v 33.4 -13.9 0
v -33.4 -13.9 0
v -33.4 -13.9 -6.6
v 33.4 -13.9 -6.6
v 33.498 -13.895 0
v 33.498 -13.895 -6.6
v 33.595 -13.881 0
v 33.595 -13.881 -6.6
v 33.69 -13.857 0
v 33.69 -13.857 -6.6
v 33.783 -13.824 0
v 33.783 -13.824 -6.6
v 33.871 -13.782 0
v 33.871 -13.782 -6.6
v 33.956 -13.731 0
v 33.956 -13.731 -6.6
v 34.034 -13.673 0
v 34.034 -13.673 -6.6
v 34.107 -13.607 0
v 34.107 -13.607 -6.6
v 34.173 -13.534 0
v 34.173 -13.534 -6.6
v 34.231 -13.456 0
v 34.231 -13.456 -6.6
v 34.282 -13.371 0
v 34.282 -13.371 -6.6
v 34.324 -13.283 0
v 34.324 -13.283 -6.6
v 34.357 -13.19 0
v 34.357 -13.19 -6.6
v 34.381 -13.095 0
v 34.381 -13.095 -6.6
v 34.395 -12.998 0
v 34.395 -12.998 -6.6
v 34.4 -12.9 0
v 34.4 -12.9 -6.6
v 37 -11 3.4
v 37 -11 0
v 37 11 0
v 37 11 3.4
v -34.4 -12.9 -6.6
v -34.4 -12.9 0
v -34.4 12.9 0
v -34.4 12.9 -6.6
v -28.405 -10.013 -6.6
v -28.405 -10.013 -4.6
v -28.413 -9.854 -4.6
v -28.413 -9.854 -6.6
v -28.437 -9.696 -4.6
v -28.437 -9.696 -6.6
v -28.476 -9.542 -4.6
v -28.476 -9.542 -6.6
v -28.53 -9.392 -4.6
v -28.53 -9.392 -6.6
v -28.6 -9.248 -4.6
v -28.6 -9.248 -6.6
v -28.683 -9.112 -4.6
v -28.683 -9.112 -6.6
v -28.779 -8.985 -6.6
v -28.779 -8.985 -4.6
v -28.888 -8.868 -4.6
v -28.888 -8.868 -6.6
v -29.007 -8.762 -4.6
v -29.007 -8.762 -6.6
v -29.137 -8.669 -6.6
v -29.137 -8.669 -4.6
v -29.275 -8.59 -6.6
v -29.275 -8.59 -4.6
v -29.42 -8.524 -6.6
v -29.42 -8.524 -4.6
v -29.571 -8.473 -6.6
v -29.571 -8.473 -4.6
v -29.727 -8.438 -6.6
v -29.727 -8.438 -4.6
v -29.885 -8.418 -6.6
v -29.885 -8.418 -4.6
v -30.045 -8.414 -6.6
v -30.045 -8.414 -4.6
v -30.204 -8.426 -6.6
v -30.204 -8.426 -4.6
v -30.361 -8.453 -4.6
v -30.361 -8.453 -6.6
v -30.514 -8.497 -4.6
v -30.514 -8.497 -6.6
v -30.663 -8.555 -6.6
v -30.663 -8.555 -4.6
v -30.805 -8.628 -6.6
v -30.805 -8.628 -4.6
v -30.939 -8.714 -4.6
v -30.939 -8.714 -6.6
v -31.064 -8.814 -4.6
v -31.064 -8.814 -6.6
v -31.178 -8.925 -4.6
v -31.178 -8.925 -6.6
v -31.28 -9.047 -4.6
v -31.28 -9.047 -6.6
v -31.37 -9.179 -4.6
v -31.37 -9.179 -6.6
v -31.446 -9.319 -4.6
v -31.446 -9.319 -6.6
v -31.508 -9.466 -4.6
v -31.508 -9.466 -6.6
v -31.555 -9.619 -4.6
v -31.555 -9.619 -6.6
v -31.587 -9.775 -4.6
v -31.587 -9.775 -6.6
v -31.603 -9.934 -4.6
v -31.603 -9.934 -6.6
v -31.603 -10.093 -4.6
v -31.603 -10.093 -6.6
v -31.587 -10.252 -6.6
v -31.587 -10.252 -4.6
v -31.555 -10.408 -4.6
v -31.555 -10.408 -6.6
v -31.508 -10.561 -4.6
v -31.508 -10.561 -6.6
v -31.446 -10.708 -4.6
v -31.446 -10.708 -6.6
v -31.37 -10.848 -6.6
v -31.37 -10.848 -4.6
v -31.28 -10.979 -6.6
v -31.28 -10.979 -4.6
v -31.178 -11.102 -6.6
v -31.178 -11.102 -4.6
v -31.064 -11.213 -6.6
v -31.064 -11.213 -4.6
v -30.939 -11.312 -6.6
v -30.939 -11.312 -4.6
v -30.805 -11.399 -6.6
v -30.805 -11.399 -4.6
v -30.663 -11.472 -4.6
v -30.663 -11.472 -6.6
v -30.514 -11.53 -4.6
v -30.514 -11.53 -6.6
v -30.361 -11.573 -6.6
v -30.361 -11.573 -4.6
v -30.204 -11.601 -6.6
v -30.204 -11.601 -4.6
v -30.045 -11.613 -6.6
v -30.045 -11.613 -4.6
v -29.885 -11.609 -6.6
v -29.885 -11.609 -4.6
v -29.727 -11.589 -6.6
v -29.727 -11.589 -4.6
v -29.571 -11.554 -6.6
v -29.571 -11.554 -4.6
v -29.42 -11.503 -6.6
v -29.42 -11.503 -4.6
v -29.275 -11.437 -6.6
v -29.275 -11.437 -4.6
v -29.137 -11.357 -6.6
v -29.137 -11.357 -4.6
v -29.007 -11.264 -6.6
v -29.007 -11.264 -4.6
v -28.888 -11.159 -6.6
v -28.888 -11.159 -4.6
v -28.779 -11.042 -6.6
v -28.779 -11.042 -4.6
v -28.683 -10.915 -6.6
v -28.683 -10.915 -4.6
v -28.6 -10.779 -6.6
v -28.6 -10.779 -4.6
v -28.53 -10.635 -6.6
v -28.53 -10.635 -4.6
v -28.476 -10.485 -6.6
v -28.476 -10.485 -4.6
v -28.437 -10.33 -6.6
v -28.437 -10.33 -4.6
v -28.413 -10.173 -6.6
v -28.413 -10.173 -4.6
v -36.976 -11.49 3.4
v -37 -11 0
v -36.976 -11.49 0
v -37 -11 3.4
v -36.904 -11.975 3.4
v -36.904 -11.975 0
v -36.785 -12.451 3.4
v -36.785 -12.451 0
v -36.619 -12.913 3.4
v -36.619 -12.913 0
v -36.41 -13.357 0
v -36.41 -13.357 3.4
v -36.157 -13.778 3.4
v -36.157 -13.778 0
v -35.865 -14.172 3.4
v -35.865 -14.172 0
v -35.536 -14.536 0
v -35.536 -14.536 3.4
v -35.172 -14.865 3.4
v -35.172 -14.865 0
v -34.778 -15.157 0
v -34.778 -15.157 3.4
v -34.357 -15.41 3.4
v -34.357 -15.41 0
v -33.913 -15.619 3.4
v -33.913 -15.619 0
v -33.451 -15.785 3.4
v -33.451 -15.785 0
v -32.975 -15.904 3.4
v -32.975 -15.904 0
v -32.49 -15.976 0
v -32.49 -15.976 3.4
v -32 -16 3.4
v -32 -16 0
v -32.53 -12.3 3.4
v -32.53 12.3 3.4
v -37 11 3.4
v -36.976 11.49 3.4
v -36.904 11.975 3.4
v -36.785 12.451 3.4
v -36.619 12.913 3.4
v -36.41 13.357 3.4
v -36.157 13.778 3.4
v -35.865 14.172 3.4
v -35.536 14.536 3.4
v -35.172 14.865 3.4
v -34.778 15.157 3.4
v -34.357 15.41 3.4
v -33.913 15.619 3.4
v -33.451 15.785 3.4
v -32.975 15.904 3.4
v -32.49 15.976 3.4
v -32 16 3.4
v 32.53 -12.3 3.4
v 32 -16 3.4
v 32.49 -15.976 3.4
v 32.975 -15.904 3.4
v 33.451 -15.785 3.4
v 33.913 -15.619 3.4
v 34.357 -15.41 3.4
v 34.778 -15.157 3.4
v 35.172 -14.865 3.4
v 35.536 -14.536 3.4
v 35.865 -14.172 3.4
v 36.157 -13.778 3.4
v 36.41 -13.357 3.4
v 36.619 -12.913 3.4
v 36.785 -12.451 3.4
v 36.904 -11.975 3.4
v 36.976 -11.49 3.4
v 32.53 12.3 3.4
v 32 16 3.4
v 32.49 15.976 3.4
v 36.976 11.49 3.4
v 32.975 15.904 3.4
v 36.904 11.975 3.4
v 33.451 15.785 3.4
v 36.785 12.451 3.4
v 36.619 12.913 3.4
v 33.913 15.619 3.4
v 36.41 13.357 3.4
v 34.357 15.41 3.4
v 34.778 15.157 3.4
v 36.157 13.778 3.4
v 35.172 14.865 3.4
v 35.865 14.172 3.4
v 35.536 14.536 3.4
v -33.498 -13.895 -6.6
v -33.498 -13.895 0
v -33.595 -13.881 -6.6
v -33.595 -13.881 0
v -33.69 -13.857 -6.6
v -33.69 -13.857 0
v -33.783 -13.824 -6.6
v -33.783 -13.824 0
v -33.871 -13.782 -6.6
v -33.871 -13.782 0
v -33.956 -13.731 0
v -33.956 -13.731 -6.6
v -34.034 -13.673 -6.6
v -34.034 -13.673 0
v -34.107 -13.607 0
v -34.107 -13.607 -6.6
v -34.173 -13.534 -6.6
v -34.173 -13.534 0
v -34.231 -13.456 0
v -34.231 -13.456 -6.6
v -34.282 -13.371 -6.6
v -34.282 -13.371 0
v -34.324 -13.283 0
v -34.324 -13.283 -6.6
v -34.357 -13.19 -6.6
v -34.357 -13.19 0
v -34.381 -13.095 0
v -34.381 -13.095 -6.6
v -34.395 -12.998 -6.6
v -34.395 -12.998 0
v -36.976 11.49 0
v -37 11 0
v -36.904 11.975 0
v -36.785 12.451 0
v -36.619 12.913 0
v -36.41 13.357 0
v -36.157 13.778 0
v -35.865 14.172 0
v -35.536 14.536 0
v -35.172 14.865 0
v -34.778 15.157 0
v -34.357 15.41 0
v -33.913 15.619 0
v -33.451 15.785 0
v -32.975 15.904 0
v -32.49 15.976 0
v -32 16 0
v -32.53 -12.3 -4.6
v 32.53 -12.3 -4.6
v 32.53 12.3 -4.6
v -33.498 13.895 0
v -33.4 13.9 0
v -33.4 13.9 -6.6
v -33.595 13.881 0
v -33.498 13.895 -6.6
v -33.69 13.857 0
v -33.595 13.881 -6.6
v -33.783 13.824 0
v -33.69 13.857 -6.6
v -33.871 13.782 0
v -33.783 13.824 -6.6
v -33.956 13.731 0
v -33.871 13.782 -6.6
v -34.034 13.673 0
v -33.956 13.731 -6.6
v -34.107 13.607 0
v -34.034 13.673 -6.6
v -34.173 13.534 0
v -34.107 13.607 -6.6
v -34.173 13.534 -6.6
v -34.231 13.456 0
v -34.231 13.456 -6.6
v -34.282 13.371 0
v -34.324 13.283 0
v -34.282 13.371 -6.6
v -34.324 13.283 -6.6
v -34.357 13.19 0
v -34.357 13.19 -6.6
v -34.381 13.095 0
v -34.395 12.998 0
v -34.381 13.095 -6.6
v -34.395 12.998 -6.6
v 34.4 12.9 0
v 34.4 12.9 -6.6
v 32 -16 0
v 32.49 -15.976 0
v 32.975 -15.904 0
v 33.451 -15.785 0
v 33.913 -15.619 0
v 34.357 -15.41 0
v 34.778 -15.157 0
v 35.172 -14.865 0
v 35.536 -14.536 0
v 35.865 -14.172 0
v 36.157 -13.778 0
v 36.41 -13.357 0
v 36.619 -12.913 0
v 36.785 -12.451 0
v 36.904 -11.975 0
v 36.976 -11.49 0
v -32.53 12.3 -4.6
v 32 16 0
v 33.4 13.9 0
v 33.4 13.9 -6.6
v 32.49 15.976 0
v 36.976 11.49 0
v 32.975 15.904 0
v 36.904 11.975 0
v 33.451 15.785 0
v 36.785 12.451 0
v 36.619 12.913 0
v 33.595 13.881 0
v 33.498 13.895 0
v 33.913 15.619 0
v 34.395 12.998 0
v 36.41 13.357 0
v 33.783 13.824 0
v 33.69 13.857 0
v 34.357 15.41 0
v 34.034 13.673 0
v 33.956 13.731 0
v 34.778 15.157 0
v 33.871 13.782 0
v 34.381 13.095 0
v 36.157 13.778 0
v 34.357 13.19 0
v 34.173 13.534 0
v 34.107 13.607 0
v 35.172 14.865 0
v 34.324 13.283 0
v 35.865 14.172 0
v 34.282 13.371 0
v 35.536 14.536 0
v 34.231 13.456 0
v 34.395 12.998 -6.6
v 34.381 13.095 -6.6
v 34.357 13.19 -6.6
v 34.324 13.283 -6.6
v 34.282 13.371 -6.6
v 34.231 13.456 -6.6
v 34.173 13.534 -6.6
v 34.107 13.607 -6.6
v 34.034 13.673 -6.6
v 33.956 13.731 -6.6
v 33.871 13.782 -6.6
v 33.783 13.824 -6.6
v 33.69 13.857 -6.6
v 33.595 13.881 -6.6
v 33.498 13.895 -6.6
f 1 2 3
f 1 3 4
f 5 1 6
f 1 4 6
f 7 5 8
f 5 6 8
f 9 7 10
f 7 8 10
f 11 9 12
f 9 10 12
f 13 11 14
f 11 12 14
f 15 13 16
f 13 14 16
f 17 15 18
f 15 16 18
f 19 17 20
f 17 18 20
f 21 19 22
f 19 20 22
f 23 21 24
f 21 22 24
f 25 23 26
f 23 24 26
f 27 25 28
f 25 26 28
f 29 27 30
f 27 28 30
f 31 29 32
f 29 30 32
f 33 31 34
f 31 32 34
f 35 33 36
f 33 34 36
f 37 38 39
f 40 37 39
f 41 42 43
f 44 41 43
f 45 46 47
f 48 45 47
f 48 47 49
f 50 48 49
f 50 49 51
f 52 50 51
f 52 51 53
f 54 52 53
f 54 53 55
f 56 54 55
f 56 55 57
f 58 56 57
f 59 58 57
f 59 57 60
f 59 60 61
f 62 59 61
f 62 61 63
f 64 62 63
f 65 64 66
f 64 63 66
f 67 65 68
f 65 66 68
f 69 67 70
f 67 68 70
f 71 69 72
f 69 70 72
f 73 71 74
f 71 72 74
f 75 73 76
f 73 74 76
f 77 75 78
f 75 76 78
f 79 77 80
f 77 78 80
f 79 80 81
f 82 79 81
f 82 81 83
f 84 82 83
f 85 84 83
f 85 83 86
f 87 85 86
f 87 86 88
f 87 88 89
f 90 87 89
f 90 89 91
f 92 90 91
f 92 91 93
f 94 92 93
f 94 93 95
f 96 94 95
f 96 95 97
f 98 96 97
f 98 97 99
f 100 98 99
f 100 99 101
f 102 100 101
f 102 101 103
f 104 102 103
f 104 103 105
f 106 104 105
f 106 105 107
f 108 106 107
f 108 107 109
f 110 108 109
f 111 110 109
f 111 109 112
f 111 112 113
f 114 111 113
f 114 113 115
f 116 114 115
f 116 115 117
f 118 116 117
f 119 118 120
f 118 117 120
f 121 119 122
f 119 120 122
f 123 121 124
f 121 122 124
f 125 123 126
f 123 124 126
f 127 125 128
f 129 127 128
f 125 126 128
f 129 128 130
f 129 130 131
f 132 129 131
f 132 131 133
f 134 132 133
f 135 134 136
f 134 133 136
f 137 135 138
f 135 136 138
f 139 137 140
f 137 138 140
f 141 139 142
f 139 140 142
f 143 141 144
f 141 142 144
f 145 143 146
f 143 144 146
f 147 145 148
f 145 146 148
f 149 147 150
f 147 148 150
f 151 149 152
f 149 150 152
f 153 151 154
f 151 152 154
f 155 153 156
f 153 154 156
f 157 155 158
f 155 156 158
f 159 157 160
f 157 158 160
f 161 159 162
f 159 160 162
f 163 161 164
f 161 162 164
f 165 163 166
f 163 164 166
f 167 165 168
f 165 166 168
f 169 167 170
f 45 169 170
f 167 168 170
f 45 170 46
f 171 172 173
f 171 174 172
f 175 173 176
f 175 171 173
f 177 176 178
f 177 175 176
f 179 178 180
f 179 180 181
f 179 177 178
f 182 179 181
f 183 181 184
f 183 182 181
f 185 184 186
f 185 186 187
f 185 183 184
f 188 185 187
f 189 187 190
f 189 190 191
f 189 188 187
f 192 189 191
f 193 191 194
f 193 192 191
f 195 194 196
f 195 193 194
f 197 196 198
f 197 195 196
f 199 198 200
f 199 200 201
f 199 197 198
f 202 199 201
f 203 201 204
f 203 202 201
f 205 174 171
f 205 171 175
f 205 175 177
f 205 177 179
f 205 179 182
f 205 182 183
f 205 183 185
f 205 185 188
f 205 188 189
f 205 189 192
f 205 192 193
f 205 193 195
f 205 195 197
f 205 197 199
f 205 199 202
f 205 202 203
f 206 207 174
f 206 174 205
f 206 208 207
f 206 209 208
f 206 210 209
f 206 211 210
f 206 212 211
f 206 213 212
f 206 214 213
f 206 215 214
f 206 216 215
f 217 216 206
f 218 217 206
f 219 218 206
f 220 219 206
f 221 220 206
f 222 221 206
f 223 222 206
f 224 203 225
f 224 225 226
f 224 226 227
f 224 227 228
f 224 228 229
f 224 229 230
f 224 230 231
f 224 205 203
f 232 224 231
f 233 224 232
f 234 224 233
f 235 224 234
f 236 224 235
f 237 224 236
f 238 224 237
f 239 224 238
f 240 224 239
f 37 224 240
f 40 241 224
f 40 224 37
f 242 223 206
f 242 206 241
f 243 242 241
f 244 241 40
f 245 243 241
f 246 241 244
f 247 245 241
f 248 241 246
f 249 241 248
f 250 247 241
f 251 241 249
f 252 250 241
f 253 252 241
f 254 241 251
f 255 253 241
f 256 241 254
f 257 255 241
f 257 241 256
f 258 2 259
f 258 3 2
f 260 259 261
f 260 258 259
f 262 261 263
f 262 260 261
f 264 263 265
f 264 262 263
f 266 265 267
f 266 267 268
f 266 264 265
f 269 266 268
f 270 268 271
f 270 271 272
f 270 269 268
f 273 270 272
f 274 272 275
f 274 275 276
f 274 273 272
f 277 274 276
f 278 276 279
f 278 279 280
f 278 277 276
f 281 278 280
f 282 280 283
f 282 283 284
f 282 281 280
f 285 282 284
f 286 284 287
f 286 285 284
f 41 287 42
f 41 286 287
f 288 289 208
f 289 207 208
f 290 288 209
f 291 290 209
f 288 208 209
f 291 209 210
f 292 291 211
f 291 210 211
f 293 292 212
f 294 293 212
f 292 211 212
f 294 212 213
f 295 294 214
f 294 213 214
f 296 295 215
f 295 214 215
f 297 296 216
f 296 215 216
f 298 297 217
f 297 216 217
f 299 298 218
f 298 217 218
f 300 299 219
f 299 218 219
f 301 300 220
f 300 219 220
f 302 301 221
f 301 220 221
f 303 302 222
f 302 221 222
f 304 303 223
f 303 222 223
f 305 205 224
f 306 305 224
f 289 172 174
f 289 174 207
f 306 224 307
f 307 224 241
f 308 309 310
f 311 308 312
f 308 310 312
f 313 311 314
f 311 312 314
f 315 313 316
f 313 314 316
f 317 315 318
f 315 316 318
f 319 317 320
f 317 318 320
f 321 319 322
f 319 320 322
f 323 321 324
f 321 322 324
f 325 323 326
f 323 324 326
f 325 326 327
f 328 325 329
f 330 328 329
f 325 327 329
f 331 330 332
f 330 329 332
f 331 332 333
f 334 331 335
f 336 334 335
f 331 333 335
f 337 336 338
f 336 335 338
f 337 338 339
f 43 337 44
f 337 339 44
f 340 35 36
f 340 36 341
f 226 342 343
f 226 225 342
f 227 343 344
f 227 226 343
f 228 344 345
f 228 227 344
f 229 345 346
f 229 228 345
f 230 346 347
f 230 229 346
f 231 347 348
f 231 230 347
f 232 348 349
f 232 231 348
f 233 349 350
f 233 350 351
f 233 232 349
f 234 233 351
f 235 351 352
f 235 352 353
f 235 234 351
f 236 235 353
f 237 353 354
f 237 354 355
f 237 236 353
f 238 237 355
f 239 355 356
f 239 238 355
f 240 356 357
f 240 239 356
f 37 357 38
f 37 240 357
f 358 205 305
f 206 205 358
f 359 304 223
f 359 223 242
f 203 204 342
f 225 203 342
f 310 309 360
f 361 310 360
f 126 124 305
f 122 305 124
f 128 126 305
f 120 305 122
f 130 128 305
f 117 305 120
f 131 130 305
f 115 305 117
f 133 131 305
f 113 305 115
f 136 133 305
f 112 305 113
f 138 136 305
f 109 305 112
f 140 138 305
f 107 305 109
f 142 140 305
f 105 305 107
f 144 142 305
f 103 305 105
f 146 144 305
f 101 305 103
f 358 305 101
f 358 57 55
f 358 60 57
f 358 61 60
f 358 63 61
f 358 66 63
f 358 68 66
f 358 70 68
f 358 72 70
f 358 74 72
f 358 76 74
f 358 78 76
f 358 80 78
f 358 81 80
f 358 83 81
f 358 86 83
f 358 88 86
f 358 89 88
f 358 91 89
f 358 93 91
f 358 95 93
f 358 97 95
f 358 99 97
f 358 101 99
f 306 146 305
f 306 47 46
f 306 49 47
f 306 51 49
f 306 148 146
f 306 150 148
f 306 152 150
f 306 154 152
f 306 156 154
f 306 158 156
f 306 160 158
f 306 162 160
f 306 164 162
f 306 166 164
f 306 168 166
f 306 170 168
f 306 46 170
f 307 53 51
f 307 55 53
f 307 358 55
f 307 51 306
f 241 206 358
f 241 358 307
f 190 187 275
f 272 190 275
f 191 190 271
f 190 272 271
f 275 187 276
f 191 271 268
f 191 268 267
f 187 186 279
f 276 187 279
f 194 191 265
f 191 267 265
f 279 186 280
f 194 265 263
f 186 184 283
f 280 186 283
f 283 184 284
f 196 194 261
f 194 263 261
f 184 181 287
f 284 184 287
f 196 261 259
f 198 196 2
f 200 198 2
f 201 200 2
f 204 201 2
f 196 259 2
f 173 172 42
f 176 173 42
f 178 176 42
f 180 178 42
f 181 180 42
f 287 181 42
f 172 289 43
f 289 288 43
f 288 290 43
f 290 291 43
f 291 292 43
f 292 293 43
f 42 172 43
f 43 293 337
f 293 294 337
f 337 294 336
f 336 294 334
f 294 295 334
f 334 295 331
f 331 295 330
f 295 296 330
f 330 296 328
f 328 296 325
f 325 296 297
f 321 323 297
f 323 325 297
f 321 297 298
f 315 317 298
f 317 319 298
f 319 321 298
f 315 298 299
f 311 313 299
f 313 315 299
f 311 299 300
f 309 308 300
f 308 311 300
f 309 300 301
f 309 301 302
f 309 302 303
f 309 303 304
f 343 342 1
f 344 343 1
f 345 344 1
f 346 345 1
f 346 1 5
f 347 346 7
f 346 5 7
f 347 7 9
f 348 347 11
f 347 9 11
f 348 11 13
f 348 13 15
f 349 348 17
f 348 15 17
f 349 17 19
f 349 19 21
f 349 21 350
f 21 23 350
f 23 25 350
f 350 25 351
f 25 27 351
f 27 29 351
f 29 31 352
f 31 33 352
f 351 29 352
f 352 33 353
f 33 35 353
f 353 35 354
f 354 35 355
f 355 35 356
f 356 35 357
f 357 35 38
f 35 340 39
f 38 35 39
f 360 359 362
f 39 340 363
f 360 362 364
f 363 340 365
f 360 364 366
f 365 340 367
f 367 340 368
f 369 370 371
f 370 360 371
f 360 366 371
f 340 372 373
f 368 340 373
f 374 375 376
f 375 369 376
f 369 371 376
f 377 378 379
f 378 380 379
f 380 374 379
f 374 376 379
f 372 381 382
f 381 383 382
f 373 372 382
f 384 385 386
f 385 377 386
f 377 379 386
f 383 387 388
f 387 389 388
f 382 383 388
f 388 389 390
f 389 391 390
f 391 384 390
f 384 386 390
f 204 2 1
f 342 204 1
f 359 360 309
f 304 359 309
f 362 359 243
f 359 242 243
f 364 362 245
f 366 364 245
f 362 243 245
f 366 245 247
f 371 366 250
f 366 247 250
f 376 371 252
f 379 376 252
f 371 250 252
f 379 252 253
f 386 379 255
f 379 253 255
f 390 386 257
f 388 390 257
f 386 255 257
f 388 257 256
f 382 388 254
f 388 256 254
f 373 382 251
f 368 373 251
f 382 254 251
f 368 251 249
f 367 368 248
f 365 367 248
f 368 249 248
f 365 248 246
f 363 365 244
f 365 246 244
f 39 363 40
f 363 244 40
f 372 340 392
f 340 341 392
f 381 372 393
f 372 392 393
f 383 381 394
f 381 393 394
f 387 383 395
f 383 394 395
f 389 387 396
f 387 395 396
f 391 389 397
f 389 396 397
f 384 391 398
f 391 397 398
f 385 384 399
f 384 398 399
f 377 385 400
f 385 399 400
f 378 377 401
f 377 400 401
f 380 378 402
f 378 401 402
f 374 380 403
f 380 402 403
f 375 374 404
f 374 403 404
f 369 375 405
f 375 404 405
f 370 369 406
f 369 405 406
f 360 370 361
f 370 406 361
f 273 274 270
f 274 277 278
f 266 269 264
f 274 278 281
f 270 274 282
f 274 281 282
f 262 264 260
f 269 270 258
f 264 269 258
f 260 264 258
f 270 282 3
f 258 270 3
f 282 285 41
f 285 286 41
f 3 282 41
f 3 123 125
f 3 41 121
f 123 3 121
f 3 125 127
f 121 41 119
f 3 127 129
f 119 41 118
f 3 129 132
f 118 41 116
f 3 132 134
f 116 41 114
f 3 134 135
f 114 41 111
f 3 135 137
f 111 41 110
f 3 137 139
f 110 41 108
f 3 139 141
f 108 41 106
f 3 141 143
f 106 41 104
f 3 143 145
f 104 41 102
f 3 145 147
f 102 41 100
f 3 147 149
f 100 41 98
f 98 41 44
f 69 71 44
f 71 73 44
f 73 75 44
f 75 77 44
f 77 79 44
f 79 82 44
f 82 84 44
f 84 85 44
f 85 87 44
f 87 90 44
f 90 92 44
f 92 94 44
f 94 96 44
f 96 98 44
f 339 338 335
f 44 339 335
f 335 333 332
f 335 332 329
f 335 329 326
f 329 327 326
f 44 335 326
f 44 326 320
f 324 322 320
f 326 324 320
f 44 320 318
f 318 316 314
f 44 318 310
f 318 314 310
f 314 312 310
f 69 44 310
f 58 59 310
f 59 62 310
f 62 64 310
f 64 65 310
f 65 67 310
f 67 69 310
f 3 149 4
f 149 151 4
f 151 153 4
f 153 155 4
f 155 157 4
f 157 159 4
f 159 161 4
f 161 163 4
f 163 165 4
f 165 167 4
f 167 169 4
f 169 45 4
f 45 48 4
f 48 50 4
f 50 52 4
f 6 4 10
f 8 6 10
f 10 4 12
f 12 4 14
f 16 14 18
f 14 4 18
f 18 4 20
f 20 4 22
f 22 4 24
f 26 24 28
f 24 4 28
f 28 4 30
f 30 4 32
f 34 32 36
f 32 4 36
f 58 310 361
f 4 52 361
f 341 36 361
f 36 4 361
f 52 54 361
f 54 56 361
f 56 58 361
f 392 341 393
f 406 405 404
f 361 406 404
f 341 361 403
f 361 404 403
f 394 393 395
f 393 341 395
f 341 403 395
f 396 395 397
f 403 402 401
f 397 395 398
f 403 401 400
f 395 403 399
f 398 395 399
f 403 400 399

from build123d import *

# Parameters (mm, degrees)
F0_W     = 74
F0_H     = 32
F1_DEPTH = 3.4
F2_W     = 68.8
F2_H     = 27.8
F3_DEPTH = 10
F4_W     = 65.06
F4_H     = 24.6
F5_DEPTH = 8
F6_R     = 5
F7_R     = 1.6
F8_DEPTH = 10.001
F9_R     = 1


with BuildPart() as f1:
    # F0 (on Top) → F1 (new body)
    with BuildSketch(Plane.XY):
        Rectangle(F0_W, F0_H)
    extrude(amount=F1_DEPTH)

    # F2 (on face) → F3 (join)
    with BuildSketch(Plane.XY.offset(3.4)):
        Rectangle(F2_W, F2_H)
    extrude(amount=-F3_DEPTH)

    # F4 (on face) → F5 (cut)
    with BuildSketch(Plane.XY.offset(3.4)):
        Rectangle(F4_W, F4_H)
    extrude(amount=-F5_DEPTH, mode=Mode.SUBTRACT)

    # F6
    f6_edges = [f1.edges().sort_by_distance(p)[0] for p in [
        (-37, -16, 1.7),
        (37, -16, 1.7),
        (37, 16, 1.7),
        (-37, 16, 1.7),
    ]]
    fillet(f6_edges, radius=F6_R)

    # F7 (on face) → F8 (cut, through all)
    with BuildSketch(Plane.XY.offset(3.4)):
        with Locations((-30.004807, -10.013314)):
            Circle(F7_R)
    extrude(amount=-F8_DEPTH, mode=Mode.SUBTRACT)

    # F9
    f9_edges = [f1.edges().sort_by_distance(p)[0] for p in [
        (-34.4, 13.9, -3.3),
        (-34.4, -13.9, -3.3),
        (34.4, -13.9, -3.3),
        (34.4, 13.9, -3.3),
    ]]
    fillet(f9_edges, radius=F9_R)


solid = f1.part
